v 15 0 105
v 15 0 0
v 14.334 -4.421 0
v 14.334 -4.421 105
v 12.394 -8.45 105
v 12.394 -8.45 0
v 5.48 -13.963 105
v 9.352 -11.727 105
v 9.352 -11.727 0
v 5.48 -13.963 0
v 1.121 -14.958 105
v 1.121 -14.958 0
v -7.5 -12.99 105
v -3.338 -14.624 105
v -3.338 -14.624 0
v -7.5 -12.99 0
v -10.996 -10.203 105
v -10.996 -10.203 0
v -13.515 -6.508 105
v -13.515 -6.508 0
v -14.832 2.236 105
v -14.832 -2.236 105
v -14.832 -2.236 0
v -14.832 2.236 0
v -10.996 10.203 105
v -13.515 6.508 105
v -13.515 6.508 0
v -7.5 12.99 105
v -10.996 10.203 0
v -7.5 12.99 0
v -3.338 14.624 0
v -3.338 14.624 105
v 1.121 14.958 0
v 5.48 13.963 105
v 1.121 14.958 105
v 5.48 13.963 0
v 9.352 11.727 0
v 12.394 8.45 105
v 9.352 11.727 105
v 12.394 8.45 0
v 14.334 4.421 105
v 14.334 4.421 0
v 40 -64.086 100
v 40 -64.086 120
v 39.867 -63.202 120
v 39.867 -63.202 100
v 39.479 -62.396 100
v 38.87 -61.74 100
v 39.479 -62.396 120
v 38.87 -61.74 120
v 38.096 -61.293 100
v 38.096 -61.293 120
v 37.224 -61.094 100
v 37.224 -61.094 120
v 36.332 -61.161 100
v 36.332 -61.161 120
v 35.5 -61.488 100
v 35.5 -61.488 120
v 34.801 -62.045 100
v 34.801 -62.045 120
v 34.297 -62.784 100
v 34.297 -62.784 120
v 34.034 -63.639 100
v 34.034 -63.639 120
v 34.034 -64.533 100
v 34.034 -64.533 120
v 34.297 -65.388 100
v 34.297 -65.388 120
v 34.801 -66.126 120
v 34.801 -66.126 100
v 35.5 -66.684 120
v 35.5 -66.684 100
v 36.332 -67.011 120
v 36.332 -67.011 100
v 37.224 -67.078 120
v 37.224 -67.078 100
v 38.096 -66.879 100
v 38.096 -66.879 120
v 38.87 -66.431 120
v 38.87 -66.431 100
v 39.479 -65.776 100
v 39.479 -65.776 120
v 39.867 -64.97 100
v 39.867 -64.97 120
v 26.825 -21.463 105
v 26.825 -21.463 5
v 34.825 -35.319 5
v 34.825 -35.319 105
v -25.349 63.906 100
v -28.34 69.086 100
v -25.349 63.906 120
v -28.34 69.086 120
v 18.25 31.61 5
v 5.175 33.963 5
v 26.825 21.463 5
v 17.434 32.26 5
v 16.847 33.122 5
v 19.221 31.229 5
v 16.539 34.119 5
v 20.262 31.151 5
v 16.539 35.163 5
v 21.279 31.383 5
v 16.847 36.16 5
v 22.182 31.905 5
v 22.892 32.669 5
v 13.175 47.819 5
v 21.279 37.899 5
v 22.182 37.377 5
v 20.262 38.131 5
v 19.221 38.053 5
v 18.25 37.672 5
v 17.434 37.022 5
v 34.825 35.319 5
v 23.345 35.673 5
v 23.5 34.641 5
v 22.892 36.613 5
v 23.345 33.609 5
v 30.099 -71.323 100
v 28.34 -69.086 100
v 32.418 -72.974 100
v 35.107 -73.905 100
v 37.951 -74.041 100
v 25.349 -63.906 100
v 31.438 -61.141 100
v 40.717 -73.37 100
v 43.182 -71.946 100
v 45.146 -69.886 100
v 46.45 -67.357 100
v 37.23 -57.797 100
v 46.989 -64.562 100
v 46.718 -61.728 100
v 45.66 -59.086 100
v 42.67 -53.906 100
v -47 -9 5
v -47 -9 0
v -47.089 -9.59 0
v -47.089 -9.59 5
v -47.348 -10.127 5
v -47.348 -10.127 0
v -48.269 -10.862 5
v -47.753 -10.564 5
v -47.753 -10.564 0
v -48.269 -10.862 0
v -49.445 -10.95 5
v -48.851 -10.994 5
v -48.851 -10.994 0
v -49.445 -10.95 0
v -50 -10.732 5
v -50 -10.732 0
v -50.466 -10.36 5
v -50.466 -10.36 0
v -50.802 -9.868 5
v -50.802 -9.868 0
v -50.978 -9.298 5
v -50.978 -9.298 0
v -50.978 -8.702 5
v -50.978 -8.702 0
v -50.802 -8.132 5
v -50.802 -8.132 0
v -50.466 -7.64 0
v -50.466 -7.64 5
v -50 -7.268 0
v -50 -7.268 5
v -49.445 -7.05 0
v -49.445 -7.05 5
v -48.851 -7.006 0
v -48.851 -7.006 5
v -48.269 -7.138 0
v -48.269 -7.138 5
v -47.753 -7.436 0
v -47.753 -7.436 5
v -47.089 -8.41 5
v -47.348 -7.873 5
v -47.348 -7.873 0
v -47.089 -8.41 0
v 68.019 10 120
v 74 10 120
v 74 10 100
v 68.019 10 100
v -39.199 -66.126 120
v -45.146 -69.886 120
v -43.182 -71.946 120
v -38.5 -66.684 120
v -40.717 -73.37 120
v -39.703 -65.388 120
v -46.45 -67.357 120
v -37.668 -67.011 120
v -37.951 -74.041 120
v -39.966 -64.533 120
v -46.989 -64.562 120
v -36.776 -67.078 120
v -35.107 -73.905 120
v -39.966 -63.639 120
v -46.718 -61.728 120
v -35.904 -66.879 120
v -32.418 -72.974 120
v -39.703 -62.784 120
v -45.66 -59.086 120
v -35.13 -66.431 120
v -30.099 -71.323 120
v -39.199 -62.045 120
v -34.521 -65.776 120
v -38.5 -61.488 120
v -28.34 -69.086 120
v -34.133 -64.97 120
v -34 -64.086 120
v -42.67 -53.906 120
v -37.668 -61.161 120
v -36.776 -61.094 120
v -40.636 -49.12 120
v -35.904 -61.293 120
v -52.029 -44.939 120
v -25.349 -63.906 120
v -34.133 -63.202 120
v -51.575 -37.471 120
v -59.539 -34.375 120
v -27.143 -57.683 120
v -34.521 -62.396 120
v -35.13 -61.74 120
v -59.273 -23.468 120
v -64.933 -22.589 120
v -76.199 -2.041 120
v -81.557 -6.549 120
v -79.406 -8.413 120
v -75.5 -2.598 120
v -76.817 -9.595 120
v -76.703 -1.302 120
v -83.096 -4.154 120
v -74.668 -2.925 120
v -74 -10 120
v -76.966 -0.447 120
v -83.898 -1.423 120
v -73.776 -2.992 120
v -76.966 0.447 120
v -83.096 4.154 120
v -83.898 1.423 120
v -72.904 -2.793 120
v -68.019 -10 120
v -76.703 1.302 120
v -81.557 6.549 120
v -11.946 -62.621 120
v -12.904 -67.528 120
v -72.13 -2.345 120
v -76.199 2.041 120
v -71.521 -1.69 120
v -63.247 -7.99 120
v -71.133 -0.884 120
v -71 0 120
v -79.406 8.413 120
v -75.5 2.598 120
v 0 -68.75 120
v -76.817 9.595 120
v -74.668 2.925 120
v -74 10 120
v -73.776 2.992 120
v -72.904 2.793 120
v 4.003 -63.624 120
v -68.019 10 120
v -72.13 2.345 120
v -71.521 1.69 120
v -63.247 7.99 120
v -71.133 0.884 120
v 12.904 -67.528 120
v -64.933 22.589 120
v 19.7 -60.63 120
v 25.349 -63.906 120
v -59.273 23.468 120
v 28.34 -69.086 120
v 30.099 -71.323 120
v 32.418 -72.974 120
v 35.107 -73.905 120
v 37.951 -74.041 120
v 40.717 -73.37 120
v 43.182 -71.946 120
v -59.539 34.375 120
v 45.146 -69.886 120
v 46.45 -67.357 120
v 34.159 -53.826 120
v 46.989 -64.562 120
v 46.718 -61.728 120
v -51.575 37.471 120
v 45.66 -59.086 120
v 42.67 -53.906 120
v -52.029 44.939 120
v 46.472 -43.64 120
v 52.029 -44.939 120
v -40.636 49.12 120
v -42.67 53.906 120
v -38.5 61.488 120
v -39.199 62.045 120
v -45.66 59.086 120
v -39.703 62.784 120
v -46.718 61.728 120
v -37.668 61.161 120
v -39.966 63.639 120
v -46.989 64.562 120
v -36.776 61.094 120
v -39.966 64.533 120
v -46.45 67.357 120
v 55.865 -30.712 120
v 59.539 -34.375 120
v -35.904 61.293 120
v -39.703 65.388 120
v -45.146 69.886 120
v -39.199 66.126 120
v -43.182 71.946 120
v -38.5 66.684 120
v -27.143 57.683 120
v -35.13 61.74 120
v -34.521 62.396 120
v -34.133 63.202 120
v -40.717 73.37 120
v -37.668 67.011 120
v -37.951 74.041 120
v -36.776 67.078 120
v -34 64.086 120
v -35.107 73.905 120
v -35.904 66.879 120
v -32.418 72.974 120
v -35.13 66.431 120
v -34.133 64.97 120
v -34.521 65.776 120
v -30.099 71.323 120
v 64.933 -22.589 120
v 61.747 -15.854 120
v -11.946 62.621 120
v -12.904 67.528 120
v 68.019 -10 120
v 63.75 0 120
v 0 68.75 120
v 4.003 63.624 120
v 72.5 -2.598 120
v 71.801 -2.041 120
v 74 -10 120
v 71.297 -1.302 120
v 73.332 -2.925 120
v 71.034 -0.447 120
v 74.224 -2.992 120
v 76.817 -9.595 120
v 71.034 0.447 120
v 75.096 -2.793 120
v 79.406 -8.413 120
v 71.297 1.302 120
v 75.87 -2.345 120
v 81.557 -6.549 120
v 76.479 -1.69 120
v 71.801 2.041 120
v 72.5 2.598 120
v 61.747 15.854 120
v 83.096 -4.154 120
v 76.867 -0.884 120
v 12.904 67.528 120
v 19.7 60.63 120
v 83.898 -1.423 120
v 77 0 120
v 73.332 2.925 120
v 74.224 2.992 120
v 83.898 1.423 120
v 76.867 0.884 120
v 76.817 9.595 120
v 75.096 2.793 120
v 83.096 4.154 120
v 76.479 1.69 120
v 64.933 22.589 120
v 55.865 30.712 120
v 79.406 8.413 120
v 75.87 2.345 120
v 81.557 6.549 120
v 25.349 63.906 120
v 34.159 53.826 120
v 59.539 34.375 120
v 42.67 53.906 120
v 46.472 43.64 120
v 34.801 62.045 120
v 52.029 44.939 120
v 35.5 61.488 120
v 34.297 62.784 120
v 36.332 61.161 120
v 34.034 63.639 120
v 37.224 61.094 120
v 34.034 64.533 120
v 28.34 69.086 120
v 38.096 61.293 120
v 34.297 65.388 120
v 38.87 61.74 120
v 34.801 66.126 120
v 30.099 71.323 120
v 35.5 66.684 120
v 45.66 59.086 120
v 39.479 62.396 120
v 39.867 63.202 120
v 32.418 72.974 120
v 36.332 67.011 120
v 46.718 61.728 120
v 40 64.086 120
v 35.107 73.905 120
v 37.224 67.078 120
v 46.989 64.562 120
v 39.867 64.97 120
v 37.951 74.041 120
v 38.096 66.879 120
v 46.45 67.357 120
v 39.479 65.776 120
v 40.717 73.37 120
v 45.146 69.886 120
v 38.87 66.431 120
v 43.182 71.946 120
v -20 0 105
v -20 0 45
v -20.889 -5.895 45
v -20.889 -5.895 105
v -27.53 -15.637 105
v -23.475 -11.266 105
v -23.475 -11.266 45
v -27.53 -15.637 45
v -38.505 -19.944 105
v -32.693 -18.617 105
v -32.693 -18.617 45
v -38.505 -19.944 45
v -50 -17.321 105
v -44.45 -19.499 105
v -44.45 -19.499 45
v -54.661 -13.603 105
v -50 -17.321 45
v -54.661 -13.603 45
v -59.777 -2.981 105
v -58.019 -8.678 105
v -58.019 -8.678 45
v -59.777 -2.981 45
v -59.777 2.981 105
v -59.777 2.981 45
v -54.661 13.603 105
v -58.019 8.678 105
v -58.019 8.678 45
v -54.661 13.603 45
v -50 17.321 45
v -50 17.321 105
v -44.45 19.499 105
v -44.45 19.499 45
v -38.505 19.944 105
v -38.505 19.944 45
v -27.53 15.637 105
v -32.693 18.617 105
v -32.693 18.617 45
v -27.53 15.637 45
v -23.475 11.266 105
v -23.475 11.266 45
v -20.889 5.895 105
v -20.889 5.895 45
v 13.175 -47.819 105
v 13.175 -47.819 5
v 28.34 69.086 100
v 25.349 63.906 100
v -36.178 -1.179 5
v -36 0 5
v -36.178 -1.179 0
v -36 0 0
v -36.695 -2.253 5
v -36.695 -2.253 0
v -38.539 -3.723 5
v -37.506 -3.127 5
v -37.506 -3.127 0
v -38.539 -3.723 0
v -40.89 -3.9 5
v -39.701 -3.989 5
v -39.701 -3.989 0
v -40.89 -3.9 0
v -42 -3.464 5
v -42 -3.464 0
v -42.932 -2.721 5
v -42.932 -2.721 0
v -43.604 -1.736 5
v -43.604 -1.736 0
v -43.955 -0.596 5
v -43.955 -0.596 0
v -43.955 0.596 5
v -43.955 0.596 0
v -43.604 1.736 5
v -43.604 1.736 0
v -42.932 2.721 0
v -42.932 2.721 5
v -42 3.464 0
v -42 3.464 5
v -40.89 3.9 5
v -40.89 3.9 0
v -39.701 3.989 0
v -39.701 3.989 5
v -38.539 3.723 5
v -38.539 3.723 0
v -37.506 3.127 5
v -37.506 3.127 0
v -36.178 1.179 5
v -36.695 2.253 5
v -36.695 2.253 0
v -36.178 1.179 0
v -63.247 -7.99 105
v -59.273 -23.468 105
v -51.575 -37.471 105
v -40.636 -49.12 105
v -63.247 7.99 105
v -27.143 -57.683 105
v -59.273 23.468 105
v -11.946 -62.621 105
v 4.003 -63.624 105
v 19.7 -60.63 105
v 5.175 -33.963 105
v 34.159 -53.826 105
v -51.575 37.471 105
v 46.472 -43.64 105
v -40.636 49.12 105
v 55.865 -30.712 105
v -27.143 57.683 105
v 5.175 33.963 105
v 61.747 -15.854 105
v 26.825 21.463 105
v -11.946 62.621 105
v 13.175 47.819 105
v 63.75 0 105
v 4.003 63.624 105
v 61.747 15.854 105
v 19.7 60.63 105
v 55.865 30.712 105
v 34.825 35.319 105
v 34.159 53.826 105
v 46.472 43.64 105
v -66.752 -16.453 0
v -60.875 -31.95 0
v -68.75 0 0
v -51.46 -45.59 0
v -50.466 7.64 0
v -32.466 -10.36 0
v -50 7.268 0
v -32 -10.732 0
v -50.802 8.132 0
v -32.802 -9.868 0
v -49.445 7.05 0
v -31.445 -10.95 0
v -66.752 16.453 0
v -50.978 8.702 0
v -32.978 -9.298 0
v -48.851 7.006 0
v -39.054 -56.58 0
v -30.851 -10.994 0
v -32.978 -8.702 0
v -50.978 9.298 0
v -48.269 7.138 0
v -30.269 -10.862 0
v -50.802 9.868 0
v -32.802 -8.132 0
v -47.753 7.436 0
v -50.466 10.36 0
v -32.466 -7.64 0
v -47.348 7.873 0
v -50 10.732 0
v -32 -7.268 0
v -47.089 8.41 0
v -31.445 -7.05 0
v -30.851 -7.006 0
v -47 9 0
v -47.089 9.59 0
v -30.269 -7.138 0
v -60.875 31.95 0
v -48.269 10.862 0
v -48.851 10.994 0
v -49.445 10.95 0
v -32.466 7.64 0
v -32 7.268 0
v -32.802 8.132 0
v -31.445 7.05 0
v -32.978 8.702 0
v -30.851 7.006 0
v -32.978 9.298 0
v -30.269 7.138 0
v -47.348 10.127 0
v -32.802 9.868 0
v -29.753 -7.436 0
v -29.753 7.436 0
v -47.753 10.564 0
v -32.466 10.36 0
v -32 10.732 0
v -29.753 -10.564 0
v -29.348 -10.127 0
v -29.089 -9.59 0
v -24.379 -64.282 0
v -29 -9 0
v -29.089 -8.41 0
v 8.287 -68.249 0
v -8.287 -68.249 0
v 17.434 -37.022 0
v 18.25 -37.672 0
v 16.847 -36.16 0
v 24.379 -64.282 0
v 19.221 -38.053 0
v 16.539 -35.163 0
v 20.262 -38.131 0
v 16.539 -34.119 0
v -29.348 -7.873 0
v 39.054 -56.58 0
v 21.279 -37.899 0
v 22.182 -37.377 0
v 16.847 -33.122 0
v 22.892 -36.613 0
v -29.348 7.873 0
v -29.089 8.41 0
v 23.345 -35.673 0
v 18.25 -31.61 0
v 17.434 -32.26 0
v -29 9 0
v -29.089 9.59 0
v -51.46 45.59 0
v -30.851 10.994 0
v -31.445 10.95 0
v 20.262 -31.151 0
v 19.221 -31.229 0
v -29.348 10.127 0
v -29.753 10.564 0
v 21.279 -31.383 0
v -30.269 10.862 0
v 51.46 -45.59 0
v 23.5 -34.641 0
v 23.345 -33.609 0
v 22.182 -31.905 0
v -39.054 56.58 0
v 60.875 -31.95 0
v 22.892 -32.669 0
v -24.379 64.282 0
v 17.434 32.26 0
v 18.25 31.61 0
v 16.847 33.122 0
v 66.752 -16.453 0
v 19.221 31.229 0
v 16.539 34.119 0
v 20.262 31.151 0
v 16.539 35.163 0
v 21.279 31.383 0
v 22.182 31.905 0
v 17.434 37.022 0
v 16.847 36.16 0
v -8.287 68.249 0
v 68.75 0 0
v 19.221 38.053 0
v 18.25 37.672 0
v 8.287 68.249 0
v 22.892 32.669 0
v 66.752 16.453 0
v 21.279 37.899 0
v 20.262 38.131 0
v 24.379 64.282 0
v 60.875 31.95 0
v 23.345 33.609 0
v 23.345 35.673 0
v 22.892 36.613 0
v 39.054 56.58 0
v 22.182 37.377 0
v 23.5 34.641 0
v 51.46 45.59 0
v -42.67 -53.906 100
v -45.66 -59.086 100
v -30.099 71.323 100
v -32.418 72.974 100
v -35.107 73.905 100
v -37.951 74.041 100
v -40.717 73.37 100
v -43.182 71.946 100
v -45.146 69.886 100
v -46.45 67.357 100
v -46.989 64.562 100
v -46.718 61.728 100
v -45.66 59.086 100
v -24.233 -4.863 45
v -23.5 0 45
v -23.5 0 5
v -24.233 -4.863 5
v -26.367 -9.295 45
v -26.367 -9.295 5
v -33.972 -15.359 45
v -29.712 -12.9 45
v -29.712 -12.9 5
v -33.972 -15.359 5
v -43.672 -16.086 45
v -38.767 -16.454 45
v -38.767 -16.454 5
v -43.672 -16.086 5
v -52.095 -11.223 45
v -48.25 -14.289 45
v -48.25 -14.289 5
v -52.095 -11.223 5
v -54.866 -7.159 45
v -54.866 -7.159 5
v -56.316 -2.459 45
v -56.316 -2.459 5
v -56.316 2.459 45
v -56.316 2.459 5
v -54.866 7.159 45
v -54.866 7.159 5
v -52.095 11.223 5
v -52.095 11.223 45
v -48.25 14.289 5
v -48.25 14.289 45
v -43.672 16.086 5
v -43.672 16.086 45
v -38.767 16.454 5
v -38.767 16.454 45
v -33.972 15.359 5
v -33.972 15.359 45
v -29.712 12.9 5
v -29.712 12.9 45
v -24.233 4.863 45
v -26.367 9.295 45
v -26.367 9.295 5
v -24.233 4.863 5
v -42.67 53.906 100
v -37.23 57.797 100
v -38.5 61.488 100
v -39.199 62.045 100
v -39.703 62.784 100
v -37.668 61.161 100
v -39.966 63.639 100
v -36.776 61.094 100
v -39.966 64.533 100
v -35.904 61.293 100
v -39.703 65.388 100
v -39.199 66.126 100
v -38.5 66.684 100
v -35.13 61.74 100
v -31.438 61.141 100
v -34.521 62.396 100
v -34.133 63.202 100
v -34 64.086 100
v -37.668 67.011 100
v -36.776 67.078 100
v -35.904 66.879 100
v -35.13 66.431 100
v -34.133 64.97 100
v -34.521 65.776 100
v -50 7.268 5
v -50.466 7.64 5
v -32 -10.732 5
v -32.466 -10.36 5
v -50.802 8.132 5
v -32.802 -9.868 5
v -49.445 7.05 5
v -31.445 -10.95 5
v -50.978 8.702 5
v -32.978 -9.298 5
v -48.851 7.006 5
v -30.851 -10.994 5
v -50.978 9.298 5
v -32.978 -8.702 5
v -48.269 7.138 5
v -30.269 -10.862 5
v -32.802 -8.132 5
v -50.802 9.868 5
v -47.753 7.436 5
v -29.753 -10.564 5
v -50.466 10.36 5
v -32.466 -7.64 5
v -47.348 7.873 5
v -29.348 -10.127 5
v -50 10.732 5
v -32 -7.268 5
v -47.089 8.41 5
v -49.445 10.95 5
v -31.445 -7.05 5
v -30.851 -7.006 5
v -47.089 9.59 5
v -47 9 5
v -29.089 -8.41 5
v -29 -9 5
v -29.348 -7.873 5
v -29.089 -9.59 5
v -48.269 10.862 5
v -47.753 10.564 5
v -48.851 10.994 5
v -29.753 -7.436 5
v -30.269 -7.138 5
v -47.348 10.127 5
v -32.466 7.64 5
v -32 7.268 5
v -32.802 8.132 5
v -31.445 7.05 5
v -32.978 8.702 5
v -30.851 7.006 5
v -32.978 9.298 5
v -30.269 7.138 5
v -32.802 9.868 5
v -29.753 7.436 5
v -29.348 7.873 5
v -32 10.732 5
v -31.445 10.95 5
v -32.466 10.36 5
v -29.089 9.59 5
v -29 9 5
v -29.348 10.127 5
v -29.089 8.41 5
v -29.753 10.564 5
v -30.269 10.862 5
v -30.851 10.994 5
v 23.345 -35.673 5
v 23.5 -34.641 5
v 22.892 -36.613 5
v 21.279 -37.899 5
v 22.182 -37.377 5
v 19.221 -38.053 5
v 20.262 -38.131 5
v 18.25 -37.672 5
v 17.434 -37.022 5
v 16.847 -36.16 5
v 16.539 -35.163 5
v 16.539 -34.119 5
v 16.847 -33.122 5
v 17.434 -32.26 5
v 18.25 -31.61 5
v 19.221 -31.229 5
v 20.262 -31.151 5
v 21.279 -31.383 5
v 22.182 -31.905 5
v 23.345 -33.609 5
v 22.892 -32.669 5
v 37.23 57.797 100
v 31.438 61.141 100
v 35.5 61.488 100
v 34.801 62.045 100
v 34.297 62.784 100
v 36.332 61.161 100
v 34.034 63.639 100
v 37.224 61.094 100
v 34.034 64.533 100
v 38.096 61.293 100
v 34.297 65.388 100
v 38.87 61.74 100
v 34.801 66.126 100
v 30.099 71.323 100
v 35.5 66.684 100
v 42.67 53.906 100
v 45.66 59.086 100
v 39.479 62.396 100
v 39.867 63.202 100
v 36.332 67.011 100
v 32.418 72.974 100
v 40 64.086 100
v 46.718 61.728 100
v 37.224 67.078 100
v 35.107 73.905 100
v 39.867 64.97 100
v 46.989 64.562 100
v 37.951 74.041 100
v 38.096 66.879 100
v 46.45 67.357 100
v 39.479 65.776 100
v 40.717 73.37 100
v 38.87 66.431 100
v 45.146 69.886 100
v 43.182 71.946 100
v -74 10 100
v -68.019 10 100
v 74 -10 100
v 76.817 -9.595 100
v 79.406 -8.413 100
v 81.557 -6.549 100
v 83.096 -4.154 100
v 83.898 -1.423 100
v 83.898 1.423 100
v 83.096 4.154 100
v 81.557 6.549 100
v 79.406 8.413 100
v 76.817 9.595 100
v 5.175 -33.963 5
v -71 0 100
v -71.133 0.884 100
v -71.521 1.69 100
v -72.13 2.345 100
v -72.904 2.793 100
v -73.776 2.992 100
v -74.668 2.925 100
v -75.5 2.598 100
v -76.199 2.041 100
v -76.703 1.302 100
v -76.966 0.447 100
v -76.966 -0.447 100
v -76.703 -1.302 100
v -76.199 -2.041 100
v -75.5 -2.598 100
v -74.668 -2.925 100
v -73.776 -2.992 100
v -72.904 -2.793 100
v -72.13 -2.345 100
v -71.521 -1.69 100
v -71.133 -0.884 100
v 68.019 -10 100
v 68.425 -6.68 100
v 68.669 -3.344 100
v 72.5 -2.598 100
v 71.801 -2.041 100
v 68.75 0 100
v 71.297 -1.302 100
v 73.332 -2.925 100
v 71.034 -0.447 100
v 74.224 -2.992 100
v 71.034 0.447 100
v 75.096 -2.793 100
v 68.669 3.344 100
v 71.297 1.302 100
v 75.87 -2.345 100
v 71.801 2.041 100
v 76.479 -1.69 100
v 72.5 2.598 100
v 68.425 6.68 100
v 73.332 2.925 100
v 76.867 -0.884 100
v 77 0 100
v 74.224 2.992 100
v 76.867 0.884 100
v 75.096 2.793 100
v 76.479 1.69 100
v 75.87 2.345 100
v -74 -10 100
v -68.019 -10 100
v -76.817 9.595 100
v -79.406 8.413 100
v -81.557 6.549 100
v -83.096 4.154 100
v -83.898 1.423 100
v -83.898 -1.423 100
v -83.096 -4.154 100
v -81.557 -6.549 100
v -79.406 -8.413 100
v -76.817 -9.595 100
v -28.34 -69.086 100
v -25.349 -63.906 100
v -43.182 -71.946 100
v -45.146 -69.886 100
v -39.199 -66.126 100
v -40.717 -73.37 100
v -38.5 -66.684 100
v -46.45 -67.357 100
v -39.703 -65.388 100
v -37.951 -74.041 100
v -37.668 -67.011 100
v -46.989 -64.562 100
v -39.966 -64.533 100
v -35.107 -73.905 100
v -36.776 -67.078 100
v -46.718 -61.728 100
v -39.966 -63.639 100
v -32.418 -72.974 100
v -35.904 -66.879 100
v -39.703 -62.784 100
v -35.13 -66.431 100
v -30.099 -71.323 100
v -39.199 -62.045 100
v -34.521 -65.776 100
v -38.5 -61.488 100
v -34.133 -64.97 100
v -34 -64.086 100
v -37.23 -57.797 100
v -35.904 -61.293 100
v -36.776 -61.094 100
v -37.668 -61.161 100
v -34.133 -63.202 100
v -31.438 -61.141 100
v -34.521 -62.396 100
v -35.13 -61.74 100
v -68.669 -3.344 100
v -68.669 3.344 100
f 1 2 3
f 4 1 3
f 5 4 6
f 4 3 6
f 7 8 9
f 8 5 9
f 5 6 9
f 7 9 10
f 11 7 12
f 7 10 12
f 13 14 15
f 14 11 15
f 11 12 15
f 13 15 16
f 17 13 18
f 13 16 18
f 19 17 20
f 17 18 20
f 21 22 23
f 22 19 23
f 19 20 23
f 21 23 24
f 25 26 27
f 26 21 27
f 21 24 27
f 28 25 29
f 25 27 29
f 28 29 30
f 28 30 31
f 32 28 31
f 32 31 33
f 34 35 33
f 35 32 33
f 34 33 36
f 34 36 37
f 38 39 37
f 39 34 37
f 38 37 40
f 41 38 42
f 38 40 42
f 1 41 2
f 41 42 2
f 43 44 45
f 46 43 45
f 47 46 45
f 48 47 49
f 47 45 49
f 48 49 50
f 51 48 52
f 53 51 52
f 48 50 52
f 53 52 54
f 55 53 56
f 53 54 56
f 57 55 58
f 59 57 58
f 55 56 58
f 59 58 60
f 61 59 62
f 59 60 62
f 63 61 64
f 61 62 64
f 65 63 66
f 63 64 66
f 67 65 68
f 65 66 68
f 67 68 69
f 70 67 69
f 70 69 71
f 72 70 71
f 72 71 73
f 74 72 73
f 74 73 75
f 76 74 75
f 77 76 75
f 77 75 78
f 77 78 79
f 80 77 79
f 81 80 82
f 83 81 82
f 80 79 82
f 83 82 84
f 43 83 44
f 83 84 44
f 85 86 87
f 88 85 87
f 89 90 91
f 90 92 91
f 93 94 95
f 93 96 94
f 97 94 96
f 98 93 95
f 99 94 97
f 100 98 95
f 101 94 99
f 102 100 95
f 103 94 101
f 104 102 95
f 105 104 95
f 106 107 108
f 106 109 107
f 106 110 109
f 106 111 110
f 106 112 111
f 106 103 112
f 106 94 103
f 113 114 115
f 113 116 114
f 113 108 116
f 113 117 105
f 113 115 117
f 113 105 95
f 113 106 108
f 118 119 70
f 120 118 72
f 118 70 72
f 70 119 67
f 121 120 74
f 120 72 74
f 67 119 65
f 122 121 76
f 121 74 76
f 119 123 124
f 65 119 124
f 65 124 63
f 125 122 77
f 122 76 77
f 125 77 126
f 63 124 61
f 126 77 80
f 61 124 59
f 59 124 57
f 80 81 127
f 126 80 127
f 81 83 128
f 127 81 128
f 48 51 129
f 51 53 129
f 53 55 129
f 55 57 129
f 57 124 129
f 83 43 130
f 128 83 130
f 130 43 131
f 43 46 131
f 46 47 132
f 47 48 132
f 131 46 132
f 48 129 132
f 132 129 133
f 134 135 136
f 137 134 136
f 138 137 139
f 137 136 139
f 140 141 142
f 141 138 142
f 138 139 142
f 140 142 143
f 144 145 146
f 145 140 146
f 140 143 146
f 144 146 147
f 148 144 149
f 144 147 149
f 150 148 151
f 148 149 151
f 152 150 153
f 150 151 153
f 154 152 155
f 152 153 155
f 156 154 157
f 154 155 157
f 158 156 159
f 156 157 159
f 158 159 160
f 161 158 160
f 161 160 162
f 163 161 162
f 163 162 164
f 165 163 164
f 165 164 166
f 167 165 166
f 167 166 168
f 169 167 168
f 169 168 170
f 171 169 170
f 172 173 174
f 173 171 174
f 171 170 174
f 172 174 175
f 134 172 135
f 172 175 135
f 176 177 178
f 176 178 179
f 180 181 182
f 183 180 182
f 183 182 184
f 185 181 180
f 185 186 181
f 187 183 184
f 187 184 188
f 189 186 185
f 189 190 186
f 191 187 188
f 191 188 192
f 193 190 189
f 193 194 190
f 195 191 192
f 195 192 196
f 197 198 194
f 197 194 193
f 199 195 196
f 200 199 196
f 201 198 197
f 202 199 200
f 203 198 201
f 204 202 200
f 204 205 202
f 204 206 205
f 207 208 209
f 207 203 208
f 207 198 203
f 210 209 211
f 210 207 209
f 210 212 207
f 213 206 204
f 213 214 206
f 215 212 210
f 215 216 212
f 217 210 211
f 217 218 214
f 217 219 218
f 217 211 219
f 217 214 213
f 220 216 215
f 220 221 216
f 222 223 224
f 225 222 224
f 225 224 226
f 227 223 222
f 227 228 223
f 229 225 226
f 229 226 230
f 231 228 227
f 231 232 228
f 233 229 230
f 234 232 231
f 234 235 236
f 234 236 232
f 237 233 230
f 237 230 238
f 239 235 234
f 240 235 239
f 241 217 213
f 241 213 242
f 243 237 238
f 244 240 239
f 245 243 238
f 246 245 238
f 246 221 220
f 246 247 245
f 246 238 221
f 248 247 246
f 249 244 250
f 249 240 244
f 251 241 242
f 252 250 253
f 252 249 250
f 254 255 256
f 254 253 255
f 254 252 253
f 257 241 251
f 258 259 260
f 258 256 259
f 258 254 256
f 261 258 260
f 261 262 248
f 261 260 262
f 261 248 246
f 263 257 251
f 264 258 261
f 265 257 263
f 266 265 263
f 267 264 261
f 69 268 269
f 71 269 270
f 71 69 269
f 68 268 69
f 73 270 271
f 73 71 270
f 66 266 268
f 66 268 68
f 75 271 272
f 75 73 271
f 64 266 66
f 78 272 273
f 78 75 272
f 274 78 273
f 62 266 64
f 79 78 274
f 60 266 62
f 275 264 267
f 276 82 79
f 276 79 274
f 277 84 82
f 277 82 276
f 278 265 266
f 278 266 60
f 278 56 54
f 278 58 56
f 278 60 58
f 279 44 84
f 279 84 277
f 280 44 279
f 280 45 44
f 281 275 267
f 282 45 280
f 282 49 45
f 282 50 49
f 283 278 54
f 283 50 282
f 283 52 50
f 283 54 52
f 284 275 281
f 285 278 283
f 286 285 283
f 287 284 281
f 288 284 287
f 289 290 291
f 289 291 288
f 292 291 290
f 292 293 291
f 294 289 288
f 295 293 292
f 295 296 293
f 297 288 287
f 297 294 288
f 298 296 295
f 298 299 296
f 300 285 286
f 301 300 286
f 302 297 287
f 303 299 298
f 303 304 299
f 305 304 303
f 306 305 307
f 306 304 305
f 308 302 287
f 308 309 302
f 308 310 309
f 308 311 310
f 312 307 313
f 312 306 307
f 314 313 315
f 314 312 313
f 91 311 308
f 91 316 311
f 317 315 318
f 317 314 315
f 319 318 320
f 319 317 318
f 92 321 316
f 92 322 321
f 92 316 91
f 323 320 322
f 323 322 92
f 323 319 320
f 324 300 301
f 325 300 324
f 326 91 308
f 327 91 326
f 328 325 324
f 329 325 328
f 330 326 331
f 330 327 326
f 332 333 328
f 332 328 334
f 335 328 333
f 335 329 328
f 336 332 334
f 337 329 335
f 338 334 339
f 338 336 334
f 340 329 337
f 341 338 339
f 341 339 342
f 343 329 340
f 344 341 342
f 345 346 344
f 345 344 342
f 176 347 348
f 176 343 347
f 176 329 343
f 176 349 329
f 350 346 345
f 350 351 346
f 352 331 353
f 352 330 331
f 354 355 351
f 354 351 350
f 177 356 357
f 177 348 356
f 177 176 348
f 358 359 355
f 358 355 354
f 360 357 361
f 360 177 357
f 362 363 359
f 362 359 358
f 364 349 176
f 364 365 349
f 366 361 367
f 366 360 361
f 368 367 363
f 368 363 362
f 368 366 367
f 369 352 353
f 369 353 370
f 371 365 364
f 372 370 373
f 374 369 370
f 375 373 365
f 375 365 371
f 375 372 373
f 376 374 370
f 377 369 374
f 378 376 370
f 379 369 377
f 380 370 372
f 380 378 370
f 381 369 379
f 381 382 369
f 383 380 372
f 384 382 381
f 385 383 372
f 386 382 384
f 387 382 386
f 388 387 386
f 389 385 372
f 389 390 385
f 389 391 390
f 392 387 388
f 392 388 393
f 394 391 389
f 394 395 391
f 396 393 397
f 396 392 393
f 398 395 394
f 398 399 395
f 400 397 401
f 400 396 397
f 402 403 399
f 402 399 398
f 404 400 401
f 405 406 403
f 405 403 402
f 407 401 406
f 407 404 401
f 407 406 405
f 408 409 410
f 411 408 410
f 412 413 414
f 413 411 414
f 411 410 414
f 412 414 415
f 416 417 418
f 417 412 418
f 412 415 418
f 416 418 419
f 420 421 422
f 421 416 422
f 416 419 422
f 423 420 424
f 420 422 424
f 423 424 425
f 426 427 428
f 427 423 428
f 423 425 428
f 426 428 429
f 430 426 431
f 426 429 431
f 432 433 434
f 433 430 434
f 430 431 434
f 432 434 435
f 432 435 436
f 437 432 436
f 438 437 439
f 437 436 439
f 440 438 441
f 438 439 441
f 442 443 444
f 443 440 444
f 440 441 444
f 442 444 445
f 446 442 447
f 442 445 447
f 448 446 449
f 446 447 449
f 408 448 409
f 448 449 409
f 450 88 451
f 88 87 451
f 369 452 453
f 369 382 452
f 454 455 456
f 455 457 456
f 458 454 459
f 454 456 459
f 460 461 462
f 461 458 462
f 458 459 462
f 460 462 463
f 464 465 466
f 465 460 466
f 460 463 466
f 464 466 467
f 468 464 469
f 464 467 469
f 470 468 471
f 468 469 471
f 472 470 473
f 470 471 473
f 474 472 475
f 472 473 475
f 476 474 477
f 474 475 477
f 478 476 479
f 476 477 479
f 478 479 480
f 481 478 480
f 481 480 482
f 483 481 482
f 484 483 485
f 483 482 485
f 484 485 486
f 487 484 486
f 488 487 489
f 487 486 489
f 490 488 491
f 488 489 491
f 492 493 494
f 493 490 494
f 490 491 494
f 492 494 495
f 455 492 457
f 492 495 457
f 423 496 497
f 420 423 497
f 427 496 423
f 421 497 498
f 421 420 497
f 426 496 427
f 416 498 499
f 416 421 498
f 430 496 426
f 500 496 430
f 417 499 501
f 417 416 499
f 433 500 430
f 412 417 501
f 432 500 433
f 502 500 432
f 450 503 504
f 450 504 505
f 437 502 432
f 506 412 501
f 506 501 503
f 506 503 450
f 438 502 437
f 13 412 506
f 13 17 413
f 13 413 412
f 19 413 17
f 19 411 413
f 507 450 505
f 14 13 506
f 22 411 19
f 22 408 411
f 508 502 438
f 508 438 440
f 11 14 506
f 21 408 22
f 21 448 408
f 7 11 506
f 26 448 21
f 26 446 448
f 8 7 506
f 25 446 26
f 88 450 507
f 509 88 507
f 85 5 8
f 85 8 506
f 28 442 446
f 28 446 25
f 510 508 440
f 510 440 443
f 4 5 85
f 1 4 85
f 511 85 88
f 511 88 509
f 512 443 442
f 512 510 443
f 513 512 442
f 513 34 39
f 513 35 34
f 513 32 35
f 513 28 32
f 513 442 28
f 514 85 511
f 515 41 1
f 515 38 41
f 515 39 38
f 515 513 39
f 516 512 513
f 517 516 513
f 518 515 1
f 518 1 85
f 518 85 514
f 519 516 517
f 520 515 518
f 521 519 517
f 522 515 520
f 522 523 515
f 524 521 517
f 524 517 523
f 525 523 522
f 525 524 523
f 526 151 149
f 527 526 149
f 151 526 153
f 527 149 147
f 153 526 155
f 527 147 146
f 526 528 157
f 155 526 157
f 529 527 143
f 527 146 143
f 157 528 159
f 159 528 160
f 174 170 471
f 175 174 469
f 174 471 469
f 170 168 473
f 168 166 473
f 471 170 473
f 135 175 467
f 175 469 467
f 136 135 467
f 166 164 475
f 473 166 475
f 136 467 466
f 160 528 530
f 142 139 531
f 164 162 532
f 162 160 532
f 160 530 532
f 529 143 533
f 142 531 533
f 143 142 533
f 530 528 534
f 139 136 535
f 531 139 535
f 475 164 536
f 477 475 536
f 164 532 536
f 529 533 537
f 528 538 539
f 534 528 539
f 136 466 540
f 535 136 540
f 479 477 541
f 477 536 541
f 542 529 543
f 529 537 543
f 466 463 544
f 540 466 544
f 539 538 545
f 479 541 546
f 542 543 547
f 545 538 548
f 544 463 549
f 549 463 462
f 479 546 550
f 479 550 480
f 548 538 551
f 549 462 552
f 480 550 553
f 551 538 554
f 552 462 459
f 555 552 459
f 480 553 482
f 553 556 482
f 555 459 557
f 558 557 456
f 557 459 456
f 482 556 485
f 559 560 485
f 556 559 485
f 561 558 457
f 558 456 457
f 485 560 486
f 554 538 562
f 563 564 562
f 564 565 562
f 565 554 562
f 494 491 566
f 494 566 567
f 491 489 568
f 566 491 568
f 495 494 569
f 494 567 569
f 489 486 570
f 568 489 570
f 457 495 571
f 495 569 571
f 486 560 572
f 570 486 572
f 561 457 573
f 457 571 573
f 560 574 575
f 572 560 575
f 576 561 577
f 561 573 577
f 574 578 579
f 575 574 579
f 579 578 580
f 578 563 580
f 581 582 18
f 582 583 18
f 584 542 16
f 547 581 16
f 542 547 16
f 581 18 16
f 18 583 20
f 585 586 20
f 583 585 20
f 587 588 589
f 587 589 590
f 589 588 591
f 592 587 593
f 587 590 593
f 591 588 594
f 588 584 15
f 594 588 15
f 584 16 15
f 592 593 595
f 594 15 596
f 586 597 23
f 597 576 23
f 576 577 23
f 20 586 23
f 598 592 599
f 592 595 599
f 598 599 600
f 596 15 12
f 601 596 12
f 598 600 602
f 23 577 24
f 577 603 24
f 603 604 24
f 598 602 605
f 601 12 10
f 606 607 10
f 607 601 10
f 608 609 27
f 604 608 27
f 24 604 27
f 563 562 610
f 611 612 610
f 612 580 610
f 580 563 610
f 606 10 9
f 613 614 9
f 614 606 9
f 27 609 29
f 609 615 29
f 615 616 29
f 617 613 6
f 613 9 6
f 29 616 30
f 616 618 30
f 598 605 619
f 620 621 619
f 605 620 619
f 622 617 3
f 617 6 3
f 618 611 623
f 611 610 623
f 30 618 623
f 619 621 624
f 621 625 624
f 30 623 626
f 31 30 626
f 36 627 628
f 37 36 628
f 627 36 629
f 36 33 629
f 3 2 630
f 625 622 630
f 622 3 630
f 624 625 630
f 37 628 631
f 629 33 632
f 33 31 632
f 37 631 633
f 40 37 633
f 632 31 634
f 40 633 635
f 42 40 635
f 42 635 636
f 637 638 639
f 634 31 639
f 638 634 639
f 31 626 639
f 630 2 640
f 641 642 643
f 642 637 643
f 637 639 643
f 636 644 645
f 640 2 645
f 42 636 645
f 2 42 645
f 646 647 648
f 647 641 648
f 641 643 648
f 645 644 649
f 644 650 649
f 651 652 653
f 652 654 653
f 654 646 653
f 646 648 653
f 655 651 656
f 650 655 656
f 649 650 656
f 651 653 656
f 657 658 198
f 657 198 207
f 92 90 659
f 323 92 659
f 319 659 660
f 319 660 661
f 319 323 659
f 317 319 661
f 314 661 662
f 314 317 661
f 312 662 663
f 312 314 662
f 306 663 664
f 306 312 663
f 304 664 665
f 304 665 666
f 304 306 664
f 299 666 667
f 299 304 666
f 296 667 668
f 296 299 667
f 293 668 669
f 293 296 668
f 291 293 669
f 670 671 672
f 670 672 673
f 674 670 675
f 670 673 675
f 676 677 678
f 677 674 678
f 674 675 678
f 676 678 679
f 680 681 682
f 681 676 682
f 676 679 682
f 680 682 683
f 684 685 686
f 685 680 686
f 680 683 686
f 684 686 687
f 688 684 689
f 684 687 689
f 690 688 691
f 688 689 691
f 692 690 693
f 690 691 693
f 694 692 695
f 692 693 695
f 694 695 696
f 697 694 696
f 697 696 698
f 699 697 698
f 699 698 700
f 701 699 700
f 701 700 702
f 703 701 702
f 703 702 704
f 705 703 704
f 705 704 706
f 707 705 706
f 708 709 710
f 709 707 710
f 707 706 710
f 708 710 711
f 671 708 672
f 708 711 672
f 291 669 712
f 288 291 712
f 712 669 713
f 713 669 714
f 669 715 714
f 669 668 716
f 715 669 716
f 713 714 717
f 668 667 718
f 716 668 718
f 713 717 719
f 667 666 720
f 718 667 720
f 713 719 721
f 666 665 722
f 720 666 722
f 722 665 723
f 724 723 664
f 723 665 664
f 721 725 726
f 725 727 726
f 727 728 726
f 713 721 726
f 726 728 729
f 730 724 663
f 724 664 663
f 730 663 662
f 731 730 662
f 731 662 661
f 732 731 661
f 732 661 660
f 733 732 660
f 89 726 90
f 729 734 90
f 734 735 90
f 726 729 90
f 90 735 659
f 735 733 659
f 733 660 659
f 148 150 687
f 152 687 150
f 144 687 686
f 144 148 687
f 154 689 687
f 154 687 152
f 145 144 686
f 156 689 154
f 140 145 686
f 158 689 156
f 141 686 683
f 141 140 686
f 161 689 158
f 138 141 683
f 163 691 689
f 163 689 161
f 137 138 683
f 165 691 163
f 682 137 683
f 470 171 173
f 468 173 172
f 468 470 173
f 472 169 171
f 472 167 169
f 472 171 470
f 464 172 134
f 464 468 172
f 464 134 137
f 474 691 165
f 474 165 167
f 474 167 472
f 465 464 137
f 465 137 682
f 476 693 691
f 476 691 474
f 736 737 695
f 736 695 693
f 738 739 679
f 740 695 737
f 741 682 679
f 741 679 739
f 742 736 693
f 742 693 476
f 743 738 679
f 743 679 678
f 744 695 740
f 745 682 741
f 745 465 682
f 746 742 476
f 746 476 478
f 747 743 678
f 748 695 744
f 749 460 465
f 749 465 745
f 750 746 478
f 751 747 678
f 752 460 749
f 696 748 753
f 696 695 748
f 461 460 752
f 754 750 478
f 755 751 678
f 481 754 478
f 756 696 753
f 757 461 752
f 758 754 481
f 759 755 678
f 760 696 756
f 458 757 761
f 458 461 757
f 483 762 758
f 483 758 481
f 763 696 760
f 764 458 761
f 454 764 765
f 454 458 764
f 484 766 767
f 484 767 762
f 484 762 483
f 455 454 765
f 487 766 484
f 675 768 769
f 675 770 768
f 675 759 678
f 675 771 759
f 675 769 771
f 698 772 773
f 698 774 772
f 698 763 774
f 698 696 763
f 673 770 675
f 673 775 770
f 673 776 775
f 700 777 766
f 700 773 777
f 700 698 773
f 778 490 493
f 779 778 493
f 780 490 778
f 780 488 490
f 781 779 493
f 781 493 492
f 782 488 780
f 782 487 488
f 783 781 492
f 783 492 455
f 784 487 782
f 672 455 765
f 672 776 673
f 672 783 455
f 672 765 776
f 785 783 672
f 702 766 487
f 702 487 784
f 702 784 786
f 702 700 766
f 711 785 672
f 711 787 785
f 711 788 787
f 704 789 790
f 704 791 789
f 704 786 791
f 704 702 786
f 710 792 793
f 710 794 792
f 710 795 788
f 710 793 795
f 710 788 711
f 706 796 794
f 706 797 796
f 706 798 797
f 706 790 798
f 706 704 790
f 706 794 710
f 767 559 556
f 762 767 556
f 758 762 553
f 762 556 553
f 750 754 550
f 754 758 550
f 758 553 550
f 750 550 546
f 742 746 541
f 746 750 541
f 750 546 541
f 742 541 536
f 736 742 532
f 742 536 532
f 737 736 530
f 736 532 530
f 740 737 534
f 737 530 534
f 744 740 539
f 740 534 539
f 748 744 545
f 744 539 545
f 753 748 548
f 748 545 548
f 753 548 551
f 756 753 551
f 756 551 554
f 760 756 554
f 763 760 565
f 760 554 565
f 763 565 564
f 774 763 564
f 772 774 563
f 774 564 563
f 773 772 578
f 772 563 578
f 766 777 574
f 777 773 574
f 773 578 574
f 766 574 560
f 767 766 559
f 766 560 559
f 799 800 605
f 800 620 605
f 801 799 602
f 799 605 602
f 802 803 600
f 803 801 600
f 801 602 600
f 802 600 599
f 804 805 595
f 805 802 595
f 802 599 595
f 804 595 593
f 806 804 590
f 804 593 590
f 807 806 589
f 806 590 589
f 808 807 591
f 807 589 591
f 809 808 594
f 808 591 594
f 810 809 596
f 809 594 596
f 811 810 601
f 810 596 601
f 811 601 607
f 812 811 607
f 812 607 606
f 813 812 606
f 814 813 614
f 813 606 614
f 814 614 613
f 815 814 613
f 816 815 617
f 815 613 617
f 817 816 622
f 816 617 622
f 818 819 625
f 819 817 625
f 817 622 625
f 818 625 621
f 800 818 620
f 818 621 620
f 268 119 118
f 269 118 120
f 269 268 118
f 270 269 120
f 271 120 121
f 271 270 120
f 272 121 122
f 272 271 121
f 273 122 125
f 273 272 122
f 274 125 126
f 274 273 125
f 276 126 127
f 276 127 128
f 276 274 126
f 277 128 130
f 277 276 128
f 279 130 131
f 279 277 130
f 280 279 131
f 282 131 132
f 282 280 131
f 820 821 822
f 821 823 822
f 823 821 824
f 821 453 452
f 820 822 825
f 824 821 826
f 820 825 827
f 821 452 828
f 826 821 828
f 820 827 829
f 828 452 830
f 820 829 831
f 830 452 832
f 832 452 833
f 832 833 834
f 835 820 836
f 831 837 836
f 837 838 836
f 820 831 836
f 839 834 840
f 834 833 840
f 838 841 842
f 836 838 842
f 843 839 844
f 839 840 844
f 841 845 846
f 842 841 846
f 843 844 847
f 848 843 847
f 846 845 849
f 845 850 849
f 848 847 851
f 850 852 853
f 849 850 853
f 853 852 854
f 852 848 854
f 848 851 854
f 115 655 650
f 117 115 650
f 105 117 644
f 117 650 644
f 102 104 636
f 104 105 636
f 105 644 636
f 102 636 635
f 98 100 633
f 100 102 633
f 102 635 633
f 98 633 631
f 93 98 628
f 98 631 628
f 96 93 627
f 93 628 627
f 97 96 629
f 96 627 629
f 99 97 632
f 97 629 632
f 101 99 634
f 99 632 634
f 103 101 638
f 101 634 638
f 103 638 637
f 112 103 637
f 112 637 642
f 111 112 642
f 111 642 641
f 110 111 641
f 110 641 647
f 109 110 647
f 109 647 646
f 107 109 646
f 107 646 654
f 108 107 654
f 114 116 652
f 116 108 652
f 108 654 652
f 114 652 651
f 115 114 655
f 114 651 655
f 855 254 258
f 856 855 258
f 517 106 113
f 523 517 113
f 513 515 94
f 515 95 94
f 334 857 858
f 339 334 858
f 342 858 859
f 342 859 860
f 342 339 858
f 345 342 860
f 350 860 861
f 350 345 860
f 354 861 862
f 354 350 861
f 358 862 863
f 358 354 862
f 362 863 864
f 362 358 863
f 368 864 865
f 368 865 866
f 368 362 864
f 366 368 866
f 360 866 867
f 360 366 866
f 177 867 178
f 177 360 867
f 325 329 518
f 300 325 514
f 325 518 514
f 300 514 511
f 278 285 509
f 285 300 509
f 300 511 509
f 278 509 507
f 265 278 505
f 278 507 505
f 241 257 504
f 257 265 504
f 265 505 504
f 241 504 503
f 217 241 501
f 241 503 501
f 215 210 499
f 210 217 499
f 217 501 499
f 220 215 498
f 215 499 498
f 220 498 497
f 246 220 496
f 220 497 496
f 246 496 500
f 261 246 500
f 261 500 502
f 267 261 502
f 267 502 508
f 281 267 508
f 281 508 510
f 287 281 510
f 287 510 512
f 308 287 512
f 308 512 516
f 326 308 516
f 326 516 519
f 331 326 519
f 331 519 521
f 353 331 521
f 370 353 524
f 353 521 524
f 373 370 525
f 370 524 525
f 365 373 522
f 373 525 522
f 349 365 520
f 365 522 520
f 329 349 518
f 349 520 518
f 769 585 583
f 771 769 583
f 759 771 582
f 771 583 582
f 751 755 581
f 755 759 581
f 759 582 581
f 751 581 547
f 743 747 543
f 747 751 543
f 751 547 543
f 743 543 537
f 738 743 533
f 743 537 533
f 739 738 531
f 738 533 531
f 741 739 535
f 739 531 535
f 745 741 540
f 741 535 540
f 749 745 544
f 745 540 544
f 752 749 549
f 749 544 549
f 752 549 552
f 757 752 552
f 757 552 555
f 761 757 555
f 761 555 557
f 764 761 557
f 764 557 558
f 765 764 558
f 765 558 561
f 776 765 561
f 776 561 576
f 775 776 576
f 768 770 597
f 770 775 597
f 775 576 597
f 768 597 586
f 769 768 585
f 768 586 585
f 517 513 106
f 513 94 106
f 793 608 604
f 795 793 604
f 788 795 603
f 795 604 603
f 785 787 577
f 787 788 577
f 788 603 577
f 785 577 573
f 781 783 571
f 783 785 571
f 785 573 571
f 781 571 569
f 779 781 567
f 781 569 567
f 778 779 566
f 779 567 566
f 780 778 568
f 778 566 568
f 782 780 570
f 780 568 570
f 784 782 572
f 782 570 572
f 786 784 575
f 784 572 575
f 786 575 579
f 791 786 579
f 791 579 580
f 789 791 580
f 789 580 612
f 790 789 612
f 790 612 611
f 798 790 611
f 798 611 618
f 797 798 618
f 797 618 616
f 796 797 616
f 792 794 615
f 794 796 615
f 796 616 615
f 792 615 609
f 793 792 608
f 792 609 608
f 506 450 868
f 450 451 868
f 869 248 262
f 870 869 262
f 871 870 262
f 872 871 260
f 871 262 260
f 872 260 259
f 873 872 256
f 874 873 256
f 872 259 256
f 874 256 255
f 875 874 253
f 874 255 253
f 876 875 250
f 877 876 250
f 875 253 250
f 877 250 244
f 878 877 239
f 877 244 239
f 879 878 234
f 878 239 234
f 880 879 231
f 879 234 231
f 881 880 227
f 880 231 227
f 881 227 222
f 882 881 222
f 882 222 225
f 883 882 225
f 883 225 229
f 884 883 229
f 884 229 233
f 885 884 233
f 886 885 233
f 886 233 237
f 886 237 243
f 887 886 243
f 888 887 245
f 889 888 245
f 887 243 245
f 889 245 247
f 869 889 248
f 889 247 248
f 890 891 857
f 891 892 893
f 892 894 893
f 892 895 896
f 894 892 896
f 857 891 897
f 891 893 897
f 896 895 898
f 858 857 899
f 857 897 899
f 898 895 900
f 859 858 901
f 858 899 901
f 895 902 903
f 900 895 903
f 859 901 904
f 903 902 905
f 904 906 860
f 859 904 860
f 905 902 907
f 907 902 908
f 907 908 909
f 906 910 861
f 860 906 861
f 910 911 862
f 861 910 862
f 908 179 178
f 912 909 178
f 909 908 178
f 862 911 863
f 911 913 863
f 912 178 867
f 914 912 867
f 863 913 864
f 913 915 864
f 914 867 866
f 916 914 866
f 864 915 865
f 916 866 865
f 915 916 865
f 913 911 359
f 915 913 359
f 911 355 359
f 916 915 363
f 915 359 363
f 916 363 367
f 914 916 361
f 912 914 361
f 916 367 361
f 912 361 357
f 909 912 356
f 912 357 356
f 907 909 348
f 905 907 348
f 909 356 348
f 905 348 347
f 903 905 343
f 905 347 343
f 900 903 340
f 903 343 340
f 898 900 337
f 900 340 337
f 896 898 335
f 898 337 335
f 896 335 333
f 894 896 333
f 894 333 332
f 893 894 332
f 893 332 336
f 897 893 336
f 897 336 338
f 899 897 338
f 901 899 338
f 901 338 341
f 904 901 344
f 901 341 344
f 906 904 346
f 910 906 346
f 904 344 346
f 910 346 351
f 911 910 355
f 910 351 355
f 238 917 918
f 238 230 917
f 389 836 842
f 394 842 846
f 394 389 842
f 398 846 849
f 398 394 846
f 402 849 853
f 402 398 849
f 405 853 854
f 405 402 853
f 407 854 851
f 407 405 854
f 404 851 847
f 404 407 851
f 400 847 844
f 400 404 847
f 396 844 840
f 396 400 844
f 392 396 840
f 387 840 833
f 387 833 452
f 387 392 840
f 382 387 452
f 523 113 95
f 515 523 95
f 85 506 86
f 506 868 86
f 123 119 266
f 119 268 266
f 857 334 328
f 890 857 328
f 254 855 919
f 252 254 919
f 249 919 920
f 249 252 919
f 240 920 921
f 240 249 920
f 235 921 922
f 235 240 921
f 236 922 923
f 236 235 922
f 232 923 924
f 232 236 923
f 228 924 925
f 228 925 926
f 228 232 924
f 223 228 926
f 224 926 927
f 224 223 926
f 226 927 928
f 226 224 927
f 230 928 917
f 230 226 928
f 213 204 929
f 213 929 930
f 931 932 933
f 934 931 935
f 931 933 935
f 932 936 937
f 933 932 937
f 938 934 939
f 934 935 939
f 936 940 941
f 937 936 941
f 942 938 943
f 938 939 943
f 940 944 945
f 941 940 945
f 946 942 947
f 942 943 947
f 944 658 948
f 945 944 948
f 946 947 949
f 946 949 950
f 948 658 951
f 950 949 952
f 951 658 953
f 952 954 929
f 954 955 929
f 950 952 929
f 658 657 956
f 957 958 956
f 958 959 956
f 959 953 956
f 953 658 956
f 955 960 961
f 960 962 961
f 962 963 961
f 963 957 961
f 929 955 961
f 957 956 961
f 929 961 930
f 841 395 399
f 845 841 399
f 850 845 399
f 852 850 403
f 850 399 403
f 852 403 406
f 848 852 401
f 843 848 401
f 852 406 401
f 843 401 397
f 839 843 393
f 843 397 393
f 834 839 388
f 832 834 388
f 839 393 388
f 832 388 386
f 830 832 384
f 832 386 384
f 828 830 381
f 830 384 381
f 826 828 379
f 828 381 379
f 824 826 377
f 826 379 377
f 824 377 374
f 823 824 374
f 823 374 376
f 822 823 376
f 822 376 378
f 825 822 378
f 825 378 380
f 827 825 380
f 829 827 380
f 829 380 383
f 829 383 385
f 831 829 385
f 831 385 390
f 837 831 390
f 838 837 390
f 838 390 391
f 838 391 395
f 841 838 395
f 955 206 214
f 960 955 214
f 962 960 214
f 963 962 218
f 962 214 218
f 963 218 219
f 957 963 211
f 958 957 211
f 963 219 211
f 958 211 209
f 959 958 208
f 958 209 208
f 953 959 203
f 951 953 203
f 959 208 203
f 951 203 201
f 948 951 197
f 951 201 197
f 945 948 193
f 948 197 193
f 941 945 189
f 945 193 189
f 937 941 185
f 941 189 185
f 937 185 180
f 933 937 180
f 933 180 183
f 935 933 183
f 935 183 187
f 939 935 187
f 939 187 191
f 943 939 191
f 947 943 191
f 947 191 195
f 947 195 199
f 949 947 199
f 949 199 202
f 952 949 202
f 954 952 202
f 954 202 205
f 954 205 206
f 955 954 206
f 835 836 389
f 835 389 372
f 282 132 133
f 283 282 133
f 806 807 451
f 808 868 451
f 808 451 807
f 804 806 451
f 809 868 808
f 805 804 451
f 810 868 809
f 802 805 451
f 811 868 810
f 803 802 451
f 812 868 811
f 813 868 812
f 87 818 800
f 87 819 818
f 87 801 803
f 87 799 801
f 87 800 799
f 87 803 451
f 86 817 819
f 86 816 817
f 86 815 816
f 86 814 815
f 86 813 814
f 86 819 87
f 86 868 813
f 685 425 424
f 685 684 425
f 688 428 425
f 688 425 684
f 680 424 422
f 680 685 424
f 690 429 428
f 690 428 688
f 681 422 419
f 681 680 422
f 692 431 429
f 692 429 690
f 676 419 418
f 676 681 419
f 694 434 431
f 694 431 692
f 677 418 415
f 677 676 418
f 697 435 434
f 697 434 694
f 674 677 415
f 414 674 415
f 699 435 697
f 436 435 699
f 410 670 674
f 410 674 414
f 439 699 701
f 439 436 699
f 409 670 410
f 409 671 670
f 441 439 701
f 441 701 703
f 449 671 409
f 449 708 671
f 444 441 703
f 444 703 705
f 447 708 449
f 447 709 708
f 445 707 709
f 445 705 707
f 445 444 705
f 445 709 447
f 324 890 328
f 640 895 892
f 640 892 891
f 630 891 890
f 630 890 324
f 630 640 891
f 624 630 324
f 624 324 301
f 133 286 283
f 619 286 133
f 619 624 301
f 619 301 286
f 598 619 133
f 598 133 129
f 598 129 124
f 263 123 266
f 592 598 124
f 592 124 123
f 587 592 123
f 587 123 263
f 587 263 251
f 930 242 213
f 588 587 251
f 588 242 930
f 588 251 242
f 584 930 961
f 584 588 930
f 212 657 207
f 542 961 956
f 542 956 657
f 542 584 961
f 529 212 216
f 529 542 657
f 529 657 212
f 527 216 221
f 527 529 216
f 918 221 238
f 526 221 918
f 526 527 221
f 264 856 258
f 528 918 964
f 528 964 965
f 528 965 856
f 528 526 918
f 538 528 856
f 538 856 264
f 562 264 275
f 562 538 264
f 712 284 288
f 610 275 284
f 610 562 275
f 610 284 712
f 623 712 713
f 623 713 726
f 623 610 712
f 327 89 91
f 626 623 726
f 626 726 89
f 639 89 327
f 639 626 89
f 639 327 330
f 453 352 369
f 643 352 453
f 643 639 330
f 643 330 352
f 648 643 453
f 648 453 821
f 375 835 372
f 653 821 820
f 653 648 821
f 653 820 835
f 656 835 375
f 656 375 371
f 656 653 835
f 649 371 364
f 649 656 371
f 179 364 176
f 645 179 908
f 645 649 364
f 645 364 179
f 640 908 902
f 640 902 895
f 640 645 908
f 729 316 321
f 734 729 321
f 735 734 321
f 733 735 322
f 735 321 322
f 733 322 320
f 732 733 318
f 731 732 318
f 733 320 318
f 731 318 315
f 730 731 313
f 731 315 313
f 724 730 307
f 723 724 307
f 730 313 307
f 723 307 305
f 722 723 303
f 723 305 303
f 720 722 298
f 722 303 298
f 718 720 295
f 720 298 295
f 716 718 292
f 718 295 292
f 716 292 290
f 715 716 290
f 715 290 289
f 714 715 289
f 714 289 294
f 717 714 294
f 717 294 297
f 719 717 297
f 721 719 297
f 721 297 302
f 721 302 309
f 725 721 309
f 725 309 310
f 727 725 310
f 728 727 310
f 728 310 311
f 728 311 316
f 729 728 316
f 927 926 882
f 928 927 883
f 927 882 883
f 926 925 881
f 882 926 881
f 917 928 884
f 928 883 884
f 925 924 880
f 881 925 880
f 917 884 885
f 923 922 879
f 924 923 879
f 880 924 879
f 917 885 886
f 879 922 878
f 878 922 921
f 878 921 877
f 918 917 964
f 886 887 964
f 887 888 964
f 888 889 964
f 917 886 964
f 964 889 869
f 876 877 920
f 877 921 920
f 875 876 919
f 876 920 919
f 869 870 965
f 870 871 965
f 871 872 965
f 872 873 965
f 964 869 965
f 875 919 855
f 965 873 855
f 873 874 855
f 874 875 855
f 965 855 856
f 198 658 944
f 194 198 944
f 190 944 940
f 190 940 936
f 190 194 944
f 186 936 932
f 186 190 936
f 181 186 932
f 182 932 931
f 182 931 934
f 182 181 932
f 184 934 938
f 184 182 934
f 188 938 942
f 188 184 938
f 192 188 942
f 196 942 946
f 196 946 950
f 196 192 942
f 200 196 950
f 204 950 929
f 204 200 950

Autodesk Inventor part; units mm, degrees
ref_plane "YZ Plane" through (0, 0, 0) normal (1, 0, 0) x (0, 1, 0)
ref_plane "XZ Plane" through (0, 0, 0) normal (0, 1, 0) x (-1, 0, 0)
ref_plane "XY Plane" through (0, 0, 0) normal (0, 0, 1) x (1, 0, 0)
sketch "Sketch1" plane through (0, 0, 0) normal (0, 0, 1) x (1, 0, 0)
  circle A0 centre (0, 0) radius 68.75
  circle A1 centre (0, 0) radius 15
  circle A2 centre (-40, 0) radius 4
  line L0 (-49, 9) -> (-31, 9) construction
  line L1 (-31, 9) -> (-31, -9) construction
  line L2 (-31, -9) -> (-49, -9) construction
  line L3 (-49, -9) -> (-49, 9) construction
  circle A3 centre (-49, 9) radius 2
  circle A4 centre (-31, 9) radius 2
  circle A5 centre (-31, -9) radius 2
  circle A6 centre (-49, -9) radius 2
  circle A7 centre (20, 34.641) radius 3.5
  line L4 (0, 0) -> (-40, 0) construction
  line L5 (0, 0) -> (20, 34.641) construction
  line L6 (0, 0) -> (20, -34.641) construction
  circle A8 centre (20, -34.641) radius 3.5
  point P0 (-49, 0)
  point P1 (-40, 9)
  dimension "d0" = 137.5
  dimension "d1" = 30
  dimension "d2" = 8
  dimension "d3" = 40
  dimension "d4" = 18
  dimension "d5" = 18
  dimension "d6" = 4
  dimension "d7" = 4
  dimension "d8" = 4
  dimension "d9" = 4
  dimension "d10" = 7
  dimension "d11" = 40
  dimension "d12" = 120
  dimension "d13" = 40
  dimension "d14" = 7
  dimension "d15" = 120
extrude "Extrusion1" add sketch "Sketch1" along normal blind 5
sketch "Sketch2" plane through (0, 0, 5) normal (0, 0, 1) x (1, 0, 0)
  circle A0 centre (0, 0) radius 68.75 projected
  circle A1 centre (0, 0) radius 63.75
  dimension "d18" = 5
extrude "Extrusion2" add sketch "Sketch2" along normal blind 115
sketch "Sketch3" plane through (0, 0, 5) normal (0, 0, 1) x (1, 0, 0)
  circle A0 centre (-40, 0) radius 4 projected
  circle A1 centre (0, 0) radius 15 projected
  circle A2 centre (20, 34.641) radius 3.5 projected
  circle A3 centre (20, -34.641) radius 3.5 projected
  circle A4 centre (-40, 0) radius 20
  line L0 (26.8253, 21.4628) -> (5.1747, 33.9628)
  line L1 (5.1747, 33.9628) -> (13.1747, 47.8192)
  line L2 (13.1747, 47.8192) -> (34.8253, 35.3192)
  line L3 (34.8253, 35.3192) -> (26.8253, 21.4628)
  line L4 (26.8253, 21.4628) -> (13.1747, 47.8192) construction
  line L5 (5.1747, 33.9628) -> (34.8253, 35.3192) construction
  line L6 (0, 0) -> (-40, 0) construction
  line L7 (5.1747, -33.9628) -> (26.8253, -21.4628)
  line L8 (26.8253, -21.4628) -> (34.8253, -35.3192)
  line L9 (34.8253, -35.3192) -> (13.1747, -47.8192)
  line L10 (13.1747, -47.8192) -> (5.1747, -33.9628)
  circle A5 centre (0, 0) radius 63.75 projected
  dimension "d21" = 40
  dimension "d23" = 120
  dimension "d24" = 16
  dimension "d25" = 25
  dimension "d28" = 120
extrude "Extrusion3" add sketch "Sketch3" along normal blind 100 contours A5
sketch "Sketch4" plane through (0, 0, 105) normal (0, 0, 1) x (1, 0, 0)
  circle A0 centre (50, 0) radius 3
  circle A1 centre (-25, 43.3013) radius 3
  circle A2 centre (-25, -43.3013) radius 3
  circle A3 centre (50, 0) radius 15
  circle A4 centre (-25, 43.3013) radius 15
  circle A5 centre (-25, -43.3013) radius 15
  point P0 (0, 0)
  dimension "d32" = 6
  dimension "d33" = 50
  dimension "d36" = 360
  dimension "d38" = 30
  dimension "d39" = 30
  dimension "d40" = 30
extrude "Extrusion4" add sketch "Sketch4" along normal blind 15
sketch "Sketch6" plane through (-40, 0, 5) normal (0, 0, 1) x (1, 0, 0)
  circle A0 centre (0, 0) radius 4 projected
  circle A1 centre (0, 0) radius 16.5
  circle A2 centre (0, 0) radius 20 projected
  point P0 (40, 0)
  point P1 (20, 0)
  dimension "d46" = 33
extrude "Extrusion6" add sketch "Sketch6" along normal blind 40 contours A2
sketch "Sketch7" plane through (0, 0, 120) normal (0, 0, 1) x (1, 0, 0)
  circle A0 centre (37, 64.0859) radius 10
  line L0 (28.3397, 69.0859) -> (25.3492, 63.906)
  line L1 (45.6603, 59.0859) -> (42.6697, 53.906)
  circle A1 centre (0, 0) radius 68.75 construction
  line L2 (0, 0) -> (37, 64.0859) construction
  line L3 (25.3492, 63.906) -> (42.6697, 53.906)
  circle A2 centre (20, 34.641) radius 3.5 projected
  circle A3 centre (37, 64.0859) radius 3
  circle A4 centre (-37, 64.0859) radius 10
  line L4 (-45.6603, 59.0859) -> (-42.6697, 53.906)
  line L5 (-28.3397, 69.0859) -> (-25.3492, 63.906)
  line L6 (-42.6697, 53.906) -> (-25.3492, 63.906)
  circle A5 centre (-37, 64.0859) radius 3
  circle A6 centre (-74, 0) radius 10
  line L7 (-74, -10) -> (-68.0188, -10)
  line L8 (-74, 10) -> (-68.0188, 10)
  line L9 (-68.0188, -10) -> (-68.0188, 10)
  circle A7 centre (-74, 0) radius 3
  circle A8 centre (-37, -64.0859) radius 10
  line L10 (-28.3397, -69.0859) -> (-25.3492, -63.906)
  line L11 (-45.6603, -59.0859) -> (-42.6697, -53.906)
  line L12 (-25.3492, -63.906) -> (-42.6697, -53.906)
  circle A9 centre (-37, -64.0859) radius 3
  circle A10 centre (37, -64.0859) radius 10
  line L13 (45.6603, -59.0859) -> (42.6697, -53.906)
  line L14 (28.3397, -69.0859) -> (25.3492, -63.906)
  line L15 (42.6697, -53.906) -> (25.3492, -63.906)
  circle A11 centre (37, -64.0859) radius 3
  circle A12 centre (74, 0) radius 10
  line L16 (74, 10) -> (68.0188, 10)
  line L17 (74, -10) -> (68.0188, -10)
  line L18 (68.0188, 10) -> (68.0188, -10)
  circle A13 centre (74, 0) radius 3
  dimension "d49" = 20
  dimension "d52" = 74
  dimension "d53" = 6
  dimension "d56" = 360
extrude "Extrusion7" add sketch "Sketch7" against normal blind 20 contours A0 L3 | A0 L3 L0 | L1 L3 A0 | L3 A0 | A4 L6 | A4 L5 L6 | A4 L6 | A4 L6 L4 | A6 L9 | L8 L9 A6 | A6 L9 L7 | A6 L9 | A8 L12 | L11 L12 A8 | A8 L12 L10 | A8 L12 | A10 L15 | A10 L15 L13 | L14 L15 A10 | L15 A10 | A12 L18 | A12 L18 L16 | L17 L18 A12 | L18 A12
sketch "Sketch8" plane through (0, 0, 105) normal (0, 0, 1) x (1, 0, 0)
  circle A0 centre (0, 0) radius 63.75
  dimension "d62" = 127.5
extrude "Extrusion8" cut sketch "Sketch8" along normal through all
properties part number "TA02" material "ABS Plastic"
